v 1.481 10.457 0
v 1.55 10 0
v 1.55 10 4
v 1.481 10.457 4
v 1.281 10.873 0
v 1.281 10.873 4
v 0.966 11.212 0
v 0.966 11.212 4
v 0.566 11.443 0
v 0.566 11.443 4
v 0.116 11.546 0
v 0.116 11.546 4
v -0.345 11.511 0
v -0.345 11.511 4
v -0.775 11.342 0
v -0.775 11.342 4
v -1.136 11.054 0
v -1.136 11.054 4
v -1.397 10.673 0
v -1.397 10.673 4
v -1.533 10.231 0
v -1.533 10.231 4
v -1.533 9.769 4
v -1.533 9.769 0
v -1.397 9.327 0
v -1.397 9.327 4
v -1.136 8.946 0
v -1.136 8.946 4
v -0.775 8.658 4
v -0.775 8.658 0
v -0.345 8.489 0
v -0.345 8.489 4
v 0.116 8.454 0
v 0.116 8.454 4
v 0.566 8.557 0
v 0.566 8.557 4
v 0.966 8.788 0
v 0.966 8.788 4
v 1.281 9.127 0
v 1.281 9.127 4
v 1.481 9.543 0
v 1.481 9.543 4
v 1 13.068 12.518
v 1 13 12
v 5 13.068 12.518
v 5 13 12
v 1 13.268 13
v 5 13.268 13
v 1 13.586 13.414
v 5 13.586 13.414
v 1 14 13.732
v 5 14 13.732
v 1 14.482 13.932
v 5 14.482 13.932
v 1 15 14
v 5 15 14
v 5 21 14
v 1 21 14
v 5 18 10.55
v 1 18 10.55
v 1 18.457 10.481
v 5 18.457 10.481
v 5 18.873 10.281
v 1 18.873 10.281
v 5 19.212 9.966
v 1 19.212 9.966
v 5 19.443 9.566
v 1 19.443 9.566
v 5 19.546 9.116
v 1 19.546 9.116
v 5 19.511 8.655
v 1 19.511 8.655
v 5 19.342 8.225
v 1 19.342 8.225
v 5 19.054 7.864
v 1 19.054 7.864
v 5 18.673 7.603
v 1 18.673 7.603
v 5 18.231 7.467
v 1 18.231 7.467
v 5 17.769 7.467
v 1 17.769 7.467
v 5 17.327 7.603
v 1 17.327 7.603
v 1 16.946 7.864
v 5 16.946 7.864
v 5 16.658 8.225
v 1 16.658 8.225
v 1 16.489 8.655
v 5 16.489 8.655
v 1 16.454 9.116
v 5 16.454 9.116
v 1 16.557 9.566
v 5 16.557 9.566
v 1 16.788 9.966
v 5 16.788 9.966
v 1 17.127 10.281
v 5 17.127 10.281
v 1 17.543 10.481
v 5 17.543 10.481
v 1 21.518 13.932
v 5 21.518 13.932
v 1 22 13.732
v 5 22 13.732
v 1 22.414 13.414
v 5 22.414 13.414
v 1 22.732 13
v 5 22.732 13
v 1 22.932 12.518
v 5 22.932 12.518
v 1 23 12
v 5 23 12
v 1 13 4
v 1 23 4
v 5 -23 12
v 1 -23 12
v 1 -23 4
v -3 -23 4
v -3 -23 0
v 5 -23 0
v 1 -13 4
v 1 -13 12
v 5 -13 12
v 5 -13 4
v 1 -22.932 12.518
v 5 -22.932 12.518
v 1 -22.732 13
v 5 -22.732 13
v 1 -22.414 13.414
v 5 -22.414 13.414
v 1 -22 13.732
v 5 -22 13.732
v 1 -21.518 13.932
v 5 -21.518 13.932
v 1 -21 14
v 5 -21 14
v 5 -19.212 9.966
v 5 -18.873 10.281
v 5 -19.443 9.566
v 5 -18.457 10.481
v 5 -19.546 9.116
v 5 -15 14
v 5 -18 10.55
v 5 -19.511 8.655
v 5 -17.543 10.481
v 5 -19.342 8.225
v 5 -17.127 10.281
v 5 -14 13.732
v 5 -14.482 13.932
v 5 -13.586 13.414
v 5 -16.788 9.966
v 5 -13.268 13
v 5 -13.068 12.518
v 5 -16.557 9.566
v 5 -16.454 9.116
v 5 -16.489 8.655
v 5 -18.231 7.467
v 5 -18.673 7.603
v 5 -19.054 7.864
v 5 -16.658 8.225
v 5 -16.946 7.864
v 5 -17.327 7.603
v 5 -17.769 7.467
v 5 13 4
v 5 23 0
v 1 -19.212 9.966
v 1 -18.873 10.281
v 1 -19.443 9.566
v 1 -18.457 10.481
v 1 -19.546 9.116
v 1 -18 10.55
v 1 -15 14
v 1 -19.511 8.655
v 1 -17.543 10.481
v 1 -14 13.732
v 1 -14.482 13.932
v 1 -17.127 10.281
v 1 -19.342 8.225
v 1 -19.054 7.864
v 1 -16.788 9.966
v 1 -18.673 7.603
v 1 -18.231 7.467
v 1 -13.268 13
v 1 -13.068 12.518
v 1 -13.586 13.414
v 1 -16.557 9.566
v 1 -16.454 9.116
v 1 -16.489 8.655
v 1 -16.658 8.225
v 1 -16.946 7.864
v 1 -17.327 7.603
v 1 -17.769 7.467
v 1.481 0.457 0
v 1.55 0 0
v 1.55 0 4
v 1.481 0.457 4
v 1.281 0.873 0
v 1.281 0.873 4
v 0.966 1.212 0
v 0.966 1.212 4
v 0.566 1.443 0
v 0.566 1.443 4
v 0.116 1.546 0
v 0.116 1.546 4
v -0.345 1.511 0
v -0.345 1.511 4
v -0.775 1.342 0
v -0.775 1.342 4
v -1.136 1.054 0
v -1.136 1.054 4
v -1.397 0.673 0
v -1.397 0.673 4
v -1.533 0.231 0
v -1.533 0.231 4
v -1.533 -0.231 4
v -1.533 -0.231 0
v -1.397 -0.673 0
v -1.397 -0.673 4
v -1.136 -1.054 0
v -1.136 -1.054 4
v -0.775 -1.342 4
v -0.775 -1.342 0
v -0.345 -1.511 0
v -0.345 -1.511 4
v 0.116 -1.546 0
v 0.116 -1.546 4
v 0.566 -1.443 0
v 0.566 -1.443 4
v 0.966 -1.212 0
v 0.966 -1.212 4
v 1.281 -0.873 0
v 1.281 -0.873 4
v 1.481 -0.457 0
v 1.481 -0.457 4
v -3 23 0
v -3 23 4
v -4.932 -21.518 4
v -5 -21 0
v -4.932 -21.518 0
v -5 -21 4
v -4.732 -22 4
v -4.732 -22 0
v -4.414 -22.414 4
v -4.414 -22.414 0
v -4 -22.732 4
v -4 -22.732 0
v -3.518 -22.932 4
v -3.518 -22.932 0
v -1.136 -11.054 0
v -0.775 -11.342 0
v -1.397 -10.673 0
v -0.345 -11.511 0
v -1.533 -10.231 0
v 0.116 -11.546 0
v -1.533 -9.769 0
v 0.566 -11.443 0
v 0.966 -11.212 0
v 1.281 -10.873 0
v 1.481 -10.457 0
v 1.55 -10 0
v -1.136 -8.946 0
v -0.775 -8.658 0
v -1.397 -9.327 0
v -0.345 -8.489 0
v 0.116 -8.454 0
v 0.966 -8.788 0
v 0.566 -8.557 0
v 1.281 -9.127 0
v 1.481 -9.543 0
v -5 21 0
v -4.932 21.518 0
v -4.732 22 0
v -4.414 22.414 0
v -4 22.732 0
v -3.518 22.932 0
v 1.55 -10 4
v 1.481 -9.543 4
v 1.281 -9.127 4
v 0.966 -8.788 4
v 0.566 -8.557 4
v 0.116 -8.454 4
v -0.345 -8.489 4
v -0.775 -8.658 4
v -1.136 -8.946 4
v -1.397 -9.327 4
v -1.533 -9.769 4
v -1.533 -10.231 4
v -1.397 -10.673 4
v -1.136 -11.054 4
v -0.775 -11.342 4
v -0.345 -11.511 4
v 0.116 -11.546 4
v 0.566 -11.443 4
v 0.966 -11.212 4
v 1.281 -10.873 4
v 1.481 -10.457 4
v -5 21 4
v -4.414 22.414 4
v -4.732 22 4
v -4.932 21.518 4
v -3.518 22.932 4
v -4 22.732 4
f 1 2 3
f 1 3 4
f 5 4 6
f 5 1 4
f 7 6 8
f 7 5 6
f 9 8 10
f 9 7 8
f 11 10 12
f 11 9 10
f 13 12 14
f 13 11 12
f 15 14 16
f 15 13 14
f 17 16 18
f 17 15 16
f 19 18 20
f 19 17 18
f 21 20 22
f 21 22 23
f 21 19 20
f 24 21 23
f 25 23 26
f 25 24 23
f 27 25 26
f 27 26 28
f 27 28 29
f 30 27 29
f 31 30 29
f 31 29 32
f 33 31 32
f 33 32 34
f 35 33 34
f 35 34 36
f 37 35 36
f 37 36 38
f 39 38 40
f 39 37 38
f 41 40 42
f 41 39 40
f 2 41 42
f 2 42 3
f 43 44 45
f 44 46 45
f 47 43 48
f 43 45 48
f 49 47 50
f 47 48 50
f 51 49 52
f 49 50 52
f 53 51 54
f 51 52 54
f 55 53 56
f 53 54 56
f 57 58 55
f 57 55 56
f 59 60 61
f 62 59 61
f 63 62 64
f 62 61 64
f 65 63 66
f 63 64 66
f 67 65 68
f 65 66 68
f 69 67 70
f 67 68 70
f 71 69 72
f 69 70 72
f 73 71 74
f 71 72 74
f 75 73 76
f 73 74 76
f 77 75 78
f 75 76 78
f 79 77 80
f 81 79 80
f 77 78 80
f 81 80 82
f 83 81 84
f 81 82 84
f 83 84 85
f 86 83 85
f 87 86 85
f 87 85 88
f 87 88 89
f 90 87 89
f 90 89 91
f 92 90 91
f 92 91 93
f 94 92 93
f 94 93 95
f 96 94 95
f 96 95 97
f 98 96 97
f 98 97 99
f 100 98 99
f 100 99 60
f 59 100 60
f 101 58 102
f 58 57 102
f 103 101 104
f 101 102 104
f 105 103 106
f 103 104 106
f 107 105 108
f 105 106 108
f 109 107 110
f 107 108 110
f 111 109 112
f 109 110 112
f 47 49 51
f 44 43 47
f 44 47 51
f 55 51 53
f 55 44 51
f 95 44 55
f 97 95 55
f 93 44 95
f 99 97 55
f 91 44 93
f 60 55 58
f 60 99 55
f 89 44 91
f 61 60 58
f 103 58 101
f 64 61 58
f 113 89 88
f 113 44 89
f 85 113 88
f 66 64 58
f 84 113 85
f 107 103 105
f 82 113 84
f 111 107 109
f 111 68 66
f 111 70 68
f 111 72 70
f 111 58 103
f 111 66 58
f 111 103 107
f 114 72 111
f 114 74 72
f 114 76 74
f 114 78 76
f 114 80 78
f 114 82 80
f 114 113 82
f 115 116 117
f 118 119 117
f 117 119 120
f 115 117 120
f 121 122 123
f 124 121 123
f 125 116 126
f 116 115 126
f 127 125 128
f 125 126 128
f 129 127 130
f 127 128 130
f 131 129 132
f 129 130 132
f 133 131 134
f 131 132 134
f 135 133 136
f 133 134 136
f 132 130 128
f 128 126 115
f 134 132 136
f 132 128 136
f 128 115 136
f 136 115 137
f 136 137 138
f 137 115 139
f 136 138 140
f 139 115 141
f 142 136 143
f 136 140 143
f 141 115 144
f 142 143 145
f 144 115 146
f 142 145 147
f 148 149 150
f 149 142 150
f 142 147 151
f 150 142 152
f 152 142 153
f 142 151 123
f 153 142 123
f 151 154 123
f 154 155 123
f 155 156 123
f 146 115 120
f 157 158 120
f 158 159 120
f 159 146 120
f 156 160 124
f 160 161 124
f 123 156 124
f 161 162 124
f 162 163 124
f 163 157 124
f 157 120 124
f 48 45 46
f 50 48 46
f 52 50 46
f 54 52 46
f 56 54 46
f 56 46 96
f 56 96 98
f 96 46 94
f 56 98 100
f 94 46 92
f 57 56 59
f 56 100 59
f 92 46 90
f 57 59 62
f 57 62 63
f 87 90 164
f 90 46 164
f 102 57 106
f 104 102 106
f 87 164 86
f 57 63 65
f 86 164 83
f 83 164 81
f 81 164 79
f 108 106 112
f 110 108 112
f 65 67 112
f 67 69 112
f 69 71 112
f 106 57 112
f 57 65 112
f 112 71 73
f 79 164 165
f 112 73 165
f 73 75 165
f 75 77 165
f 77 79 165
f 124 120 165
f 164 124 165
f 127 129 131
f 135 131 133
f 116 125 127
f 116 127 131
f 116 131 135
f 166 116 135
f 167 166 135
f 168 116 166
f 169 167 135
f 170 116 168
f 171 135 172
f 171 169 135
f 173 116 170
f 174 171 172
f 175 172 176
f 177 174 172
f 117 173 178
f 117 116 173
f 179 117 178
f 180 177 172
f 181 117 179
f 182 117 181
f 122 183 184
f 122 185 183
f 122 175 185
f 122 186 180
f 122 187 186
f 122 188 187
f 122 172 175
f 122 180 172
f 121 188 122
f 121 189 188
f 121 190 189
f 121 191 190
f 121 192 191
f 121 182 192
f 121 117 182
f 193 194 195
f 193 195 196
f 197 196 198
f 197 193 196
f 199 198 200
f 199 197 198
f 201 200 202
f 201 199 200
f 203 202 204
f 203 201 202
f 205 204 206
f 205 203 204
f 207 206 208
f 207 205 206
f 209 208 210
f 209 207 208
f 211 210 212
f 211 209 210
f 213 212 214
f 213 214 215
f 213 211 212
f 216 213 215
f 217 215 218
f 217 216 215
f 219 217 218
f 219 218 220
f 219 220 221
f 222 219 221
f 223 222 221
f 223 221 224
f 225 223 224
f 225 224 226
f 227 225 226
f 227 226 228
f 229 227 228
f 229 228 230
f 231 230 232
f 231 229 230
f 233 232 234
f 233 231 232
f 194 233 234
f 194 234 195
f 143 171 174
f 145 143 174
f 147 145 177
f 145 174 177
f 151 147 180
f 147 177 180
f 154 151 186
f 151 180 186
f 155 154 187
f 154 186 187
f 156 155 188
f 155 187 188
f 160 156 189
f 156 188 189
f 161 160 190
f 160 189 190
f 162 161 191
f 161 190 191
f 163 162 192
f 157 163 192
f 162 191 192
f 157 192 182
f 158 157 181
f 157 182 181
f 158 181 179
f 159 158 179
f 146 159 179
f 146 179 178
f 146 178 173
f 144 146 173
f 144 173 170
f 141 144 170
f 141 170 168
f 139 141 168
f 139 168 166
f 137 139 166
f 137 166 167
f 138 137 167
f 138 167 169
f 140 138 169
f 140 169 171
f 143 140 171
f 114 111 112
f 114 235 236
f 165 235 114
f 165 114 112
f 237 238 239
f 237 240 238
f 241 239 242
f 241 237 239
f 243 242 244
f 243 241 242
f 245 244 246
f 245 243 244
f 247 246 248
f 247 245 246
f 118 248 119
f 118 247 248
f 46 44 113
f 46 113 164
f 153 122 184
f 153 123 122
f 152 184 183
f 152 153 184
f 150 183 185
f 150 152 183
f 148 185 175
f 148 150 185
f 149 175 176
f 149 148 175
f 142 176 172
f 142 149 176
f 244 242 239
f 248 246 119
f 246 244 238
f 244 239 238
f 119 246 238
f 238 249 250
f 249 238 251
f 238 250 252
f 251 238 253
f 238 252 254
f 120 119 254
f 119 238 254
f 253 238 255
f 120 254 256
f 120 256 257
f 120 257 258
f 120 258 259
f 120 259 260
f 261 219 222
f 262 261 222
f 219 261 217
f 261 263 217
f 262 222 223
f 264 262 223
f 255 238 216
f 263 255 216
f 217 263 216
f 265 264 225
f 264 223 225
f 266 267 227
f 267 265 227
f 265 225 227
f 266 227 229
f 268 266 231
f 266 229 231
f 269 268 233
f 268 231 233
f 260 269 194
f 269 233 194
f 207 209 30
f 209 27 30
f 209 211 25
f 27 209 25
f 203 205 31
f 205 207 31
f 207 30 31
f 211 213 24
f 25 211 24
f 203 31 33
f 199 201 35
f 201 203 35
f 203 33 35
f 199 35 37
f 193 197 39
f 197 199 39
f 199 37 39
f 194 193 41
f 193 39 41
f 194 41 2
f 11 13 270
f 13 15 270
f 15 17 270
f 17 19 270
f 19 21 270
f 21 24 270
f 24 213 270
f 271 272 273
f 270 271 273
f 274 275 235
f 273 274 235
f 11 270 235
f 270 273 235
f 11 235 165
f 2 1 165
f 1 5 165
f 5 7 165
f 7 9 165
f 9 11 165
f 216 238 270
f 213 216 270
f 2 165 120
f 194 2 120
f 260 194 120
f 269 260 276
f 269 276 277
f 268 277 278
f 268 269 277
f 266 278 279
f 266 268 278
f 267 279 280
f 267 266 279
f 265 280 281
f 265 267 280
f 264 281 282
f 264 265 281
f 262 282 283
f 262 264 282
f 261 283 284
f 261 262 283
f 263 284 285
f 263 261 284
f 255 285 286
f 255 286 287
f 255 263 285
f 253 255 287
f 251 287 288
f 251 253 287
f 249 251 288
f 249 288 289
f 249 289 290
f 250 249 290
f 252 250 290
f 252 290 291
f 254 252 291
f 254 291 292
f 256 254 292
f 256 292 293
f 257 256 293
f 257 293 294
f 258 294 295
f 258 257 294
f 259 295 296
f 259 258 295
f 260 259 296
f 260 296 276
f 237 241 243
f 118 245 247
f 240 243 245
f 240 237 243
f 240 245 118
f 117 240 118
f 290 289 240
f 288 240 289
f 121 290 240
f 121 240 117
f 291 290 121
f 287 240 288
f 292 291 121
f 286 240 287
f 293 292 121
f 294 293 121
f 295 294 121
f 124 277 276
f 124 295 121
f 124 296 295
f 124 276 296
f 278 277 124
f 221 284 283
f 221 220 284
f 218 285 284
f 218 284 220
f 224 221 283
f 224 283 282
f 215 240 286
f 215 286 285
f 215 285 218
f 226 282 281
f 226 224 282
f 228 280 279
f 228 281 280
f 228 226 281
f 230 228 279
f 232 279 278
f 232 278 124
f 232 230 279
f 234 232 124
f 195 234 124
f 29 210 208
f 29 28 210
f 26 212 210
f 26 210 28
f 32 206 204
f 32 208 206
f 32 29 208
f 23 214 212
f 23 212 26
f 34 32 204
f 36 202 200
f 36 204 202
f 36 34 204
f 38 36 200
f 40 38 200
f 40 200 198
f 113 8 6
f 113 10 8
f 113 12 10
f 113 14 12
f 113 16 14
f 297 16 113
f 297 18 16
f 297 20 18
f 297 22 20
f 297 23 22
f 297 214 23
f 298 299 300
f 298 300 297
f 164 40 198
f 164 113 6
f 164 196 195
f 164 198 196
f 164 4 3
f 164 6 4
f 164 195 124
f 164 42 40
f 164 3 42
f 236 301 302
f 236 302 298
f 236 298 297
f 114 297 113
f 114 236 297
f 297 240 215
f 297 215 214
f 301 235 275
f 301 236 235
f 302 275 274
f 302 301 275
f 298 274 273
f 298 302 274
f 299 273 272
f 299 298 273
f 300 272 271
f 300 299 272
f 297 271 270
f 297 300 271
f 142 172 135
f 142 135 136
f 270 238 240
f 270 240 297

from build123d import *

# Parameters (mm, degrees)
SKETCH1_W           = 10
SKETCH1_H           = 46
SKETCH1_R           = 1.55
BOSS_EXTRUDE1_DEPTH = 4
SKETCH2_W           = 4
SKETCH2_H           = 10
BOSS_EXTRUDE2_DEPTH = 10
CUT_EXTRUDE1_REACH  = 6
SKETCH3_R           = 1.55
FILLET1_R           = 2


with BuildPart() as part:
    # Sketch1 → Boss-Extrude1 (new body)
    with BuildSketch(Plane.XY):
        Rectangle(SKETCH1_W, SKETCH1_H)
        with Locations((0, 10)):
            Circle(SKETCH1_R, mode=Mode.SUBTRACT)
        Circle(SKETCH1_R, mode=Mode.SUBTRACT)
        with Locations((0, -10)):
            Circle(SKETCH1_R, mode=Mode.SUBTRACT)
    extrude(amount=BOSS_EXTRUDE1_DEPTH)

    # Sketch2 → Boss-Extrude2 (add)
    with BuildSketch(Plane.XY.offset(4)):
        with Locations((3, 18)):
            Rectangle(SKETCH2_W, SKETCH2_H)
        with Locations((3, -18)):
            Rectangle(SKETCH2_W, SKETCH2_H)
    extrude(amount=BOSS_EXTRUDE2_DEPTH)

    # Sketch3 → Cut-Extrude1 (cut, up to next)
    with BuildSketch(Plane.ZY.offset(-1), mode=Mode.PRIVATE) as cut_extrude1_sk1:
        with Locations((9, 18)):
            Circle(SKETCH3_R)
    cut_extrude1_tool1 = extrude(cut_extrude1_sk1.sketch, amount=-CUT_EXTRUDE1_REACH, mode=Mode.PRIVATE) & part.part
    add(cut_extrude1_tool1.solids().sort_by_distance((1, 18, 9))[0], mode=Mode.SUBTRACT)
    # Sketch3 → Cut-Extrude1 (cut, up to next)
    with BuildSketch(Plane.ZY.offset(-1), mode=Mode.PRIVATE) as cut_extrude1_sk2:
        with Locations((9, -18)):
            Circle(SKETCH3_R)
    cut_extrude1_tool2 = extrude(cut_extrude1_sk2.sketch, amount=-CUT_EXTRUDE1_REACH, mode=Mode.PRIVATE) & part.part
    add(cut_extrude1_tool2.solids().sort_by_distance((1, -18, 9))[0], mode=Mode.SUBTRACT)

    # Fillet1
    fillet1_edges = [part.edges().sort_by_distance(p)[0] for p in [
        (3, 23, 14),
        (3, 13, 14),
        (3, -13, 14),
        (3, -23, 14),
        (-5, -23, 2),
        (-5, 23, 2),
    ]]
    fillet(fillet1_edges, radius=FILLET1_R)


solid = part.part
